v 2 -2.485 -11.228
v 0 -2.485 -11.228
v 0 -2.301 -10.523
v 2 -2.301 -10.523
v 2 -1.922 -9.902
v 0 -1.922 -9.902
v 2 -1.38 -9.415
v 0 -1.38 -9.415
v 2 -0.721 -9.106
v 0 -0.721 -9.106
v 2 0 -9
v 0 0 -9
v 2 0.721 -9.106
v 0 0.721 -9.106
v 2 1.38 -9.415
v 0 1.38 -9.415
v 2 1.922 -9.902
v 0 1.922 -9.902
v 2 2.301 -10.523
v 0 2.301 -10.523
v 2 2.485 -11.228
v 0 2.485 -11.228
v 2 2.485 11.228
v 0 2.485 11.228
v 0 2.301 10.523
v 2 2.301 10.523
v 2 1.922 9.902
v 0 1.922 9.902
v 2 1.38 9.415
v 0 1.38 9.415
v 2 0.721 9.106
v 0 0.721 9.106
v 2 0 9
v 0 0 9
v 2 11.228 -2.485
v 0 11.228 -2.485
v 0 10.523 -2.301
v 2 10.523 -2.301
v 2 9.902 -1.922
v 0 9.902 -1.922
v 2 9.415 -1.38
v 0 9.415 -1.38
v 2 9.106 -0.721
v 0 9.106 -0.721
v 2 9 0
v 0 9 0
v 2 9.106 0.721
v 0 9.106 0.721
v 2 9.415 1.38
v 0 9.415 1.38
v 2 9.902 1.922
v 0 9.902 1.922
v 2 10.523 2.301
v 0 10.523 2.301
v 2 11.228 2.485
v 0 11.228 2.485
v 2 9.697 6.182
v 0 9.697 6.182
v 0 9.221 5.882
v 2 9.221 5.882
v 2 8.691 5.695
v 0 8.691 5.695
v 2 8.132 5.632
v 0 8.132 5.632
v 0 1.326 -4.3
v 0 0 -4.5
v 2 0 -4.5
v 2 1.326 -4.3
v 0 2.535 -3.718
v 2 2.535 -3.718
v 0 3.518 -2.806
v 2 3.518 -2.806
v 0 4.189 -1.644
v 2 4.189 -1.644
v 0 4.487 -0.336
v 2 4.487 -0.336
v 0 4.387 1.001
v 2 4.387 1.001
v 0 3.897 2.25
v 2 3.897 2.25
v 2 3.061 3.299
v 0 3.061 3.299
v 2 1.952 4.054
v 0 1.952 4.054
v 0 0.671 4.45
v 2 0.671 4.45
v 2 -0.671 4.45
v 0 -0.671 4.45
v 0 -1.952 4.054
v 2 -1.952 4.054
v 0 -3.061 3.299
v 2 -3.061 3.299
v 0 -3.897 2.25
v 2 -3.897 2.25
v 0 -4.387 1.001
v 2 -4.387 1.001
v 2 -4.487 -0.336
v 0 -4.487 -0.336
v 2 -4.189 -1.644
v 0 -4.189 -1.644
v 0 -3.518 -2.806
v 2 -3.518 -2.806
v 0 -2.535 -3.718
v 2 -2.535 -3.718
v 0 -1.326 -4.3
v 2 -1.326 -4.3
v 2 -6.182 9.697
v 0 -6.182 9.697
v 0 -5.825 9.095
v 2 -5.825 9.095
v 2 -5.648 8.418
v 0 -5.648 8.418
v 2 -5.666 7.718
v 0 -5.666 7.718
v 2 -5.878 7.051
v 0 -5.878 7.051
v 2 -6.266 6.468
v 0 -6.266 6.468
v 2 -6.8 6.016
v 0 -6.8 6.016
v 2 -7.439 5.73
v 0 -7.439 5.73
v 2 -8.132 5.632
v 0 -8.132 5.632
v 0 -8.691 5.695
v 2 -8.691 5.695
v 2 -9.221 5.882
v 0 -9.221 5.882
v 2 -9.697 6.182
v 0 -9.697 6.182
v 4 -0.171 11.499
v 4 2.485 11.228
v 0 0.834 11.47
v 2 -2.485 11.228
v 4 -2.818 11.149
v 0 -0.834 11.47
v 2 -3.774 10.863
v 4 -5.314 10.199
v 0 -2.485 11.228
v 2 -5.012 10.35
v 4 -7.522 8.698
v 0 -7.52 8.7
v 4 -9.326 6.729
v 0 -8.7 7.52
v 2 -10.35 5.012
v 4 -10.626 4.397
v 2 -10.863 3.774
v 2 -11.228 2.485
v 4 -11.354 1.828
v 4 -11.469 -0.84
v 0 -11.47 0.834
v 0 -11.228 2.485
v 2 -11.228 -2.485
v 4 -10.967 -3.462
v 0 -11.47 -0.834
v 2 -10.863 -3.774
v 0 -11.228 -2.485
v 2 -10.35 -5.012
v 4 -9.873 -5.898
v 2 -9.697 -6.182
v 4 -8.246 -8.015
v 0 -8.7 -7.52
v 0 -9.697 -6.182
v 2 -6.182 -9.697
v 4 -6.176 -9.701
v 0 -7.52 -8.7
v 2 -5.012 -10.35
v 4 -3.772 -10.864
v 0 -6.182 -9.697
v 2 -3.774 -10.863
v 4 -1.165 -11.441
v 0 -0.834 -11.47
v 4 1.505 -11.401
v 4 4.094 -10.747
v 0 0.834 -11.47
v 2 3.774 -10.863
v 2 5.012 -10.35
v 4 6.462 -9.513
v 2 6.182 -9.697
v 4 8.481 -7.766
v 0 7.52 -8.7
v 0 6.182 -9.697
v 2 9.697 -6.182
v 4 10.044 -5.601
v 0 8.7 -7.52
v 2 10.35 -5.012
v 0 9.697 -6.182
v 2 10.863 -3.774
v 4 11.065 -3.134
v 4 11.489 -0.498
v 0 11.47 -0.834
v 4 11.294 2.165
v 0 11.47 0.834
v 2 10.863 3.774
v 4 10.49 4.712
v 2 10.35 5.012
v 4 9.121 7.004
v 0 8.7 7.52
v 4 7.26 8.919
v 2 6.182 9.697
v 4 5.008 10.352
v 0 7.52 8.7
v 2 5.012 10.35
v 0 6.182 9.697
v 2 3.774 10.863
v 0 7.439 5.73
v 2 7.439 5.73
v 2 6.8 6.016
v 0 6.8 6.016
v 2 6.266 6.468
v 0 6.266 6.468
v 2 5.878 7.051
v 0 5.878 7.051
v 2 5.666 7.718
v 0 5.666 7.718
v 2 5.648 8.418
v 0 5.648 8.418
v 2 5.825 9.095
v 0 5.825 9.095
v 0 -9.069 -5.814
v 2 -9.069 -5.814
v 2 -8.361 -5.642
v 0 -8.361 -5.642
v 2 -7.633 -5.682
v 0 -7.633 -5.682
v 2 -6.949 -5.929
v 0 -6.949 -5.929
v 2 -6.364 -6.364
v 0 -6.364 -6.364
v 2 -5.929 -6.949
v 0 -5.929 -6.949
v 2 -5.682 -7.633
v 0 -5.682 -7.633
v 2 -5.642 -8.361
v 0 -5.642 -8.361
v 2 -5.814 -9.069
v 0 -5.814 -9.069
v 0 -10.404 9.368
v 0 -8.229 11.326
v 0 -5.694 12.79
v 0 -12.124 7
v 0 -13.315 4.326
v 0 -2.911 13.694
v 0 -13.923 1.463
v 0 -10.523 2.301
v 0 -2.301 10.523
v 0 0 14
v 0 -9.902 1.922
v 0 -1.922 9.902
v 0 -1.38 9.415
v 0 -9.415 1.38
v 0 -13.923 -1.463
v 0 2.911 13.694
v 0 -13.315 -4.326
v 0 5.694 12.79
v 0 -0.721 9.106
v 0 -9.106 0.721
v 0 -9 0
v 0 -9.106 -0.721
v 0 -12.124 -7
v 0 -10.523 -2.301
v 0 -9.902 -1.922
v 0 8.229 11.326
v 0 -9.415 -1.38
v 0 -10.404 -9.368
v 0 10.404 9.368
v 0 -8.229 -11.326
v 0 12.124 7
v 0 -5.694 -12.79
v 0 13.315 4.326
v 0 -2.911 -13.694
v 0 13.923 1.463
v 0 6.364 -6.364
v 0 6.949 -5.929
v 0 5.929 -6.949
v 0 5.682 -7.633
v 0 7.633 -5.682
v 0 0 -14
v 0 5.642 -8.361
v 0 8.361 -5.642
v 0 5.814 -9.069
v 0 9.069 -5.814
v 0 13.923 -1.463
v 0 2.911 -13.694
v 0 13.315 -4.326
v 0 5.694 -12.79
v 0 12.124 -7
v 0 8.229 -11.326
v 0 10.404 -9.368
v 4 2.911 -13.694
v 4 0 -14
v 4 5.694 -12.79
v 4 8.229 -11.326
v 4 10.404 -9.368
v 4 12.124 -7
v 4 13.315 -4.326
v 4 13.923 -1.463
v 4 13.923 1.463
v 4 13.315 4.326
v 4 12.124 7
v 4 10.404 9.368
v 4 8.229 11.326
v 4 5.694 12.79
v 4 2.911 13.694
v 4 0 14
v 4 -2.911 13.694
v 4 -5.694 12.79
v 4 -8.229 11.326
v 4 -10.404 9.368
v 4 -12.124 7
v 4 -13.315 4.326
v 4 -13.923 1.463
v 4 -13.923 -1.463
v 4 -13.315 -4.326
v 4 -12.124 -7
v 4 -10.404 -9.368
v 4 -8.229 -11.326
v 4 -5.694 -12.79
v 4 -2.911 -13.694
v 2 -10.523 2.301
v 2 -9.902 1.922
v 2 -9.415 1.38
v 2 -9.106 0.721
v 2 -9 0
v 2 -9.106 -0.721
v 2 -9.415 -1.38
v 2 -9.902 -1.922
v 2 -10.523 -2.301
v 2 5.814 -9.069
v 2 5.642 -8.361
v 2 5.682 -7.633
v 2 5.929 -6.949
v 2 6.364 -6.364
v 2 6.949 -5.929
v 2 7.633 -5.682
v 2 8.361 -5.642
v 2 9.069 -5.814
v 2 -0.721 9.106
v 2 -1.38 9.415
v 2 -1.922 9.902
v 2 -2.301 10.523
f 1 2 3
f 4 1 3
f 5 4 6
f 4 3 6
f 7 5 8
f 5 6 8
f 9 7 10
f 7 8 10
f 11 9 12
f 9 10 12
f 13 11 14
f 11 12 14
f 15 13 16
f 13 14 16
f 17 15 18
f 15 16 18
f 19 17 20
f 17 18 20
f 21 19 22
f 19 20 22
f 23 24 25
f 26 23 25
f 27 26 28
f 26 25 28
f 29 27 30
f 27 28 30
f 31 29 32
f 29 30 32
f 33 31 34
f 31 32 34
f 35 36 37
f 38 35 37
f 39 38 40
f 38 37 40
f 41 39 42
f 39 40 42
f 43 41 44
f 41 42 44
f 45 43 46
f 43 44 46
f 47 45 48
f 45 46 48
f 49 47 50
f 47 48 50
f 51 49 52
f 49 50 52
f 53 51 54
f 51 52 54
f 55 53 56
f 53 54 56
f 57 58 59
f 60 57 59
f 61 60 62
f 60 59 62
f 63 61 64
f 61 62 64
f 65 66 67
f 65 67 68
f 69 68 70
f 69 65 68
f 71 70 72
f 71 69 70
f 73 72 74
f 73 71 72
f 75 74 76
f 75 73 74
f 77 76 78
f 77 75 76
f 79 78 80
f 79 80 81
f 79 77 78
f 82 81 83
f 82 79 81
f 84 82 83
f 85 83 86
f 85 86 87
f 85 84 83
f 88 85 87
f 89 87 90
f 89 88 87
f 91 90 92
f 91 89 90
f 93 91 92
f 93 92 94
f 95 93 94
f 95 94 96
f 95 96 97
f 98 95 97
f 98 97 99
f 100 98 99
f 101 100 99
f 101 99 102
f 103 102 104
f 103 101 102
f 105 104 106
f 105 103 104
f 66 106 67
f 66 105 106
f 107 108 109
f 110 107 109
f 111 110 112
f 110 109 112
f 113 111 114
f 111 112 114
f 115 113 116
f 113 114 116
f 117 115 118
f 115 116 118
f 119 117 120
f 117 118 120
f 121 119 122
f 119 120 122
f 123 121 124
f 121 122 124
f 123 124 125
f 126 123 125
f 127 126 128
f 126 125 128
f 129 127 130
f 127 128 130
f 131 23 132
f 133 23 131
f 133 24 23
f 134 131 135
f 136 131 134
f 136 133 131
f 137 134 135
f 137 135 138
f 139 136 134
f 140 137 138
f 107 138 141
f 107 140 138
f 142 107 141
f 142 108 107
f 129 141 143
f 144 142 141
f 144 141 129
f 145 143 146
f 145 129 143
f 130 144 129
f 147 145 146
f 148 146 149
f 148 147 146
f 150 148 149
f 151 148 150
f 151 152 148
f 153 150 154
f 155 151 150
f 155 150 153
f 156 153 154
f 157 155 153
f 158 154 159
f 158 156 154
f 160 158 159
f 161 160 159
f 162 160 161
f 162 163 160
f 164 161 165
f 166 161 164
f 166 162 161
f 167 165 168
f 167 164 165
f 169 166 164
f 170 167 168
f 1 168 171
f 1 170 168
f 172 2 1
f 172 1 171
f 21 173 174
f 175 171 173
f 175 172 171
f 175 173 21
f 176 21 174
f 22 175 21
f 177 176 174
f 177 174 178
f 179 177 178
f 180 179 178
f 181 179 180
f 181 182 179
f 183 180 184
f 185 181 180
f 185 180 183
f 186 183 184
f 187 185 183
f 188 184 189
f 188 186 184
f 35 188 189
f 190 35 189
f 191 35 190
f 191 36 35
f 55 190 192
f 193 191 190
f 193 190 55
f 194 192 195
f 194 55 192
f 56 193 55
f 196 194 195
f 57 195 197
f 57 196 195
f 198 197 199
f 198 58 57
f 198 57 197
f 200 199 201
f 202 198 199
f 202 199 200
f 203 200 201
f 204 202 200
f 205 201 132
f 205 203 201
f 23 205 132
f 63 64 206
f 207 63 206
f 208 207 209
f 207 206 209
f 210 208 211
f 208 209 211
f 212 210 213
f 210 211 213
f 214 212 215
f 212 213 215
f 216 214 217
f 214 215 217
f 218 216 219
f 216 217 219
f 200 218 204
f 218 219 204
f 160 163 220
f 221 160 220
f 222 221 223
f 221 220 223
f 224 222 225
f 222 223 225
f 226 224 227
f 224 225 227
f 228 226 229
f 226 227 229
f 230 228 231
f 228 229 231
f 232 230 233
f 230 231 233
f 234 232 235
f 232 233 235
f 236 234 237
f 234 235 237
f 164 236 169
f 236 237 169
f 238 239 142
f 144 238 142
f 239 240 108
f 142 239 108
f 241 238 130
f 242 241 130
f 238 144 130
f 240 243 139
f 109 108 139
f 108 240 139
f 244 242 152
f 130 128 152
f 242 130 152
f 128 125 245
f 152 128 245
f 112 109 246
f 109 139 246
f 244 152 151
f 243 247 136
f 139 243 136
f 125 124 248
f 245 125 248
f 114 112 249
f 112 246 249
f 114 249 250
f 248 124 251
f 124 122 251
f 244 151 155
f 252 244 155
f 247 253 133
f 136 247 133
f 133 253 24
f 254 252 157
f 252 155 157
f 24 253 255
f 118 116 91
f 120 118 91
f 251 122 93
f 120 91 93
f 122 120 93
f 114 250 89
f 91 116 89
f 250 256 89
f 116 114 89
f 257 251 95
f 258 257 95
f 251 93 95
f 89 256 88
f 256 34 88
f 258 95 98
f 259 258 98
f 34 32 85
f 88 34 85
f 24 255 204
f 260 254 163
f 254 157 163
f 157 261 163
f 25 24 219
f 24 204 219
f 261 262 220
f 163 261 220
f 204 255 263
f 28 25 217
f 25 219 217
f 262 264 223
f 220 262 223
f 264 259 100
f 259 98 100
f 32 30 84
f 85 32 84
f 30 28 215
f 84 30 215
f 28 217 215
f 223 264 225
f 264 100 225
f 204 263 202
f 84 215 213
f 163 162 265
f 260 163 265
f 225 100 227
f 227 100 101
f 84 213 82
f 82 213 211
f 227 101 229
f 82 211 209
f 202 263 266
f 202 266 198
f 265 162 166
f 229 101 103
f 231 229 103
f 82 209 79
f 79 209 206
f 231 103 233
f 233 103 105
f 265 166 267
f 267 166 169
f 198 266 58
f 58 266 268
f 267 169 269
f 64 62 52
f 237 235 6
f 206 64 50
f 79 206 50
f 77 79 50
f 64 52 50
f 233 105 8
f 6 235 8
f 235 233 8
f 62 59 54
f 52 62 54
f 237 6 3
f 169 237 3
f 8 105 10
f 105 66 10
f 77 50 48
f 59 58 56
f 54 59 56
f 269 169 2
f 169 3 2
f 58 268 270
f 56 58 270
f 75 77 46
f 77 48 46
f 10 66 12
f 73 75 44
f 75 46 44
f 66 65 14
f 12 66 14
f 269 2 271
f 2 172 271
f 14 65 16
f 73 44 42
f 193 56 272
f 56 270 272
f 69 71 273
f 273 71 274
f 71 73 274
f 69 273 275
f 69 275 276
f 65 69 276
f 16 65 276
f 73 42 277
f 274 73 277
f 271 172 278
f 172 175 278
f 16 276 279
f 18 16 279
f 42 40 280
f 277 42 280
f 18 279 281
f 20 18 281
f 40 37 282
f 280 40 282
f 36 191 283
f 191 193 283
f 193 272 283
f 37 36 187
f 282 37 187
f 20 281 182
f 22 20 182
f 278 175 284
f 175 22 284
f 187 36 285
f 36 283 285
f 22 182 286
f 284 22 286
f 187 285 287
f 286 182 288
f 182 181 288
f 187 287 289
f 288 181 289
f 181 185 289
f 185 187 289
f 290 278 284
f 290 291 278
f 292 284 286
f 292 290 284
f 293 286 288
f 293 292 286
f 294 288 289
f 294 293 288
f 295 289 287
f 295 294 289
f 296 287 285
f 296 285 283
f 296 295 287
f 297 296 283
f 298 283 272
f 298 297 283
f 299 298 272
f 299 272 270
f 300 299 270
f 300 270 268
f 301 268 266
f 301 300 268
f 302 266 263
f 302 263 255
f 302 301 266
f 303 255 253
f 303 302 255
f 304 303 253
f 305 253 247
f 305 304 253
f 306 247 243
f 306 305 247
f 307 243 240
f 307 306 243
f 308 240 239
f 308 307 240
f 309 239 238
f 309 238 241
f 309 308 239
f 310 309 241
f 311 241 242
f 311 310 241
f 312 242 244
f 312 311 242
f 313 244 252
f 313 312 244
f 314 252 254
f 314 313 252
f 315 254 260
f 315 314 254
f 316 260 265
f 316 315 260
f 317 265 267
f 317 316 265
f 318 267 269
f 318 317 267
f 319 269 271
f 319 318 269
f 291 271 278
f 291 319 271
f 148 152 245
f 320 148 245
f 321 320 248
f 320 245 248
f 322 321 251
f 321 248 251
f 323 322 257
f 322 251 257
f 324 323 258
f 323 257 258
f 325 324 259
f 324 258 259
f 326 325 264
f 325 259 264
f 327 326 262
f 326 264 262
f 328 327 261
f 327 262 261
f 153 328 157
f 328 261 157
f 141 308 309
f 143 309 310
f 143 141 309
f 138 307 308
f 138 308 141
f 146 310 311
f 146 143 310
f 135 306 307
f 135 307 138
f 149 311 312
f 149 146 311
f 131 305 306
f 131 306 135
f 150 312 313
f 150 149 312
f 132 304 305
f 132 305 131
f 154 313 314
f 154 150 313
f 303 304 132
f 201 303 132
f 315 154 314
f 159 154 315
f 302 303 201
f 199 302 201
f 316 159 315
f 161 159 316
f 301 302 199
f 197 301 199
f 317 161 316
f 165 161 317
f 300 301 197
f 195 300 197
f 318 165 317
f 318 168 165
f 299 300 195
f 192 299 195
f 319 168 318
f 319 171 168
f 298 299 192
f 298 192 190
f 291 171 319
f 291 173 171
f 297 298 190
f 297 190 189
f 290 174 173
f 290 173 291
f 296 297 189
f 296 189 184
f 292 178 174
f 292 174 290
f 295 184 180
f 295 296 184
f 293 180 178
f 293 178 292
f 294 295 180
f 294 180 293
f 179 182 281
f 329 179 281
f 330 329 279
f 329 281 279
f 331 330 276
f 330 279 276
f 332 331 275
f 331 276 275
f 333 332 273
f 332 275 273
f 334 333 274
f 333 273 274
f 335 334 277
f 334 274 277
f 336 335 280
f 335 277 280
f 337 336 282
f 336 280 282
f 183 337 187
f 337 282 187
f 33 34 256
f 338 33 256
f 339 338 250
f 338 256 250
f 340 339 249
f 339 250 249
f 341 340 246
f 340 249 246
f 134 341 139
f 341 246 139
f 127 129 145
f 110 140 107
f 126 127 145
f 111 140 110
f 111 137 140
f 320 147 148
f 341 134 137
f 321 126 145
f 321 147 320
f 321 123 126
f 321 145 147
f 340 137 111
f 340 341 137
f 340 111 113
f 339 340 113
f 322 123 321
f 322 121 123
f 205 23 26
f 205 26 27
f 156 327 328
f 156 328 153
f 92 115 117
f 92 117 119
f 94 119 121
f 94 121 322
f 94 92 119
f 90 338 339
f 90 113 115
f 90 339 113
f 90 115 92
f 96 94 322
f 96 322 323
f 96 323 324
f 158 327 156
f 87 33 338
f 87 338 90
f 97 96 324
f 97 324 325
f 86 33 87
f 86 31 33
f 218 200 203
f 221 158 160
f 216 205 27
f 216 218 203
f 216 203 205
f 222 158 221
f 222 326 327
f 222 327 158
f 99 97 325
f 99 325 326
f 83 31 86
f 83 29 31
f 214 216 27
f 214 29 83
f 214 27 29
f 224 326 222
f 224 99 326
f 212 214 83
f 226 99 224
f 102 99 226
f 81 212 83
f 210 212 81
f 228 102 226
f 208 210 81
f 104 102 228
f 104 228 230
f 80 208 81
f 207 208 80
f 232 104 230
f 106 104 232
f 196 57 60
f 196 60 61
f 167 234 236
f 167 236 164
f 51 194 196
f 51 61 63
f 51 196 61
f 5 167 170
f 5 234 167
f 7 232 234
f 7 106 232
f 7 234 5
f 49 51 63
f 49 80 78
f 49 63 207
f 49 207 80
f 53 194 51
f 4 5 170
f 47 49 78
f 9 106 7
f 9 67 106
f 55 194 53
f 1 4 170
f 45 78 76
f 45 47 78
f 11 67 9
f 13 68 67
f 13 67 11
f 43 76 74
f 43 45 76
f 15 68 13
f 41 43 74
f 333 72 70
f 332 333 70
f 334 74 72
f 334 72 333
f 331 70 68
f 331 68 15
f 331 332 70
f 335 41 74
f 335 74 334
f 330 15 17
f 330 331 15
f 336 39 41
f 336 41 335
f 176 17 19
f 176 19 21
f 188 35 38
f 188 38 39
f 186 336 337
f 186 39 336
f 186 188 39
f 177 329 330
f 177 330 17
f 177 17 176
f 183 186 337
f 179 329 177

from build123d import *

# Parameters (mm, degrees)
ESBO_O1_R                = 4.5
RESSALTO_EXTRUS_O1_DEPTH = 2
ESBO_O2_R                = 14
ESBO_O2_R_2              = 11.5
RESSALTO_EXTRUS_O2_DEPTH = 2


with BuildPart() as part:
    # Esboço1 → Ressalto-extrusão1 (new body)
    with BuildSketch(Plane(origin=(0, 0, 0), x_dir=(0, 0, -1), z_dir=(1, 0, 0))):
        with BuildLine():
            ThreePointArc((11.22826087, -2.485187688), (9, 0), (11.22826087, 2.485187688))
            ThreePointArc((11.22826087, 2.485187688), (10.624614624, 4.400859472), (9.696872469, 6.182286335))
            ThreePointArc((9.696872469, 6.182286335), (6.363961031, 6.363961031), (6.182286335, 9.696872469))
            ThreePointArc((6.182286335, 9.696872469), (4.400859472, 10.624614624), (2.485187688, 11.22826087))
            ThreePointArc((2.485187688, 11.22826087), (0, 9), (-2.485187688, 11.22826087))
            ThreePointArc((-2.485187688, 11.22826087), (-4.400859472, 10.624614624), (-6.182286335, 9.696872469))
            ThreePointArc((-6.182286335, 9.696872469), (-5.773380668, 8.961304948), (-5.631727984, 8.131727984))
            ThreePointArc((-5.631727984, 8.131727984), (-7.050724101, 5.877525108), (-9.696872469, 6.182286335))
            ThreePointArc((-9.696872469, 6.182286335), (-10.624614624, 4.400859472), (-11.22826087, 2.485187688))
            ThreePointArc((-11.22826087, 2.485187688), (-9.638636545, 1.668929623), (-9, 0))
            ThreePointArc((-9, 0), (-9.638636545, -1.668929623), (-11.22826087, -2.485187688))
            ThreePointArc((-11.22826087, -2.485187688), (-10.624614624, -4.400859472), (-9.696872469, -6.182286335))
            ThreePointArc((-9.696872469, -6.182286335), (-7.050724101, -5.877525108), (-5.631727984, -8.131727984))
            ThreePointArc((-5.631727984, -8.131727984), (-5.773380668, -8.961304948), (-6.182286335, -9.696872469))
            ThreePointArc((-6.182286335, -9.696872469), (-4.400859472, -10.624614624), (-2.485187688, -11.22826087))
            ThreePointArc((-2.485187688, -11.22826087), (0, -9), (2.485187688, -11.22826087))
            ThreePointArc((2.485187688, -11.22826087), (4.400859472, -10.624614624), (6.182286335, -9.696872469))
            ThreePointArc((6.182286335, -9.696872469), (6.363961031, -6.363961031), (9.696872469, -6.182286335))
            ThreePointArc((9.696872469, -6.182286335), (10.624614624, -4.400859472), (11.22826087, -2.485187688))
        make_face()
        Circle(ESBO_O1_R, mode=Mode.SUBTRACT)
    extrude(amount=RESSALTO_EXTRUS_O1_DEPTH)

    # Esboço2 → Ressalto-extrusão2 (add, symmetric)
    with BuildSketch(Plane(origin=(2, 0, 0), x_dir=(0, 0, -1), z_dir=(1, 0, 0))):
        Circle(ESBO_O2_R)
        with Locations(Location((0, 0, 0), (0, 0, 167.519737803))):
            Circle(ESBO_O2_R_2, mode=Mode.SUBTRACT)
    extrude(amount=RESSALTO_EXTRUS_O2_DEPTH, both=True)


solid = part.part
